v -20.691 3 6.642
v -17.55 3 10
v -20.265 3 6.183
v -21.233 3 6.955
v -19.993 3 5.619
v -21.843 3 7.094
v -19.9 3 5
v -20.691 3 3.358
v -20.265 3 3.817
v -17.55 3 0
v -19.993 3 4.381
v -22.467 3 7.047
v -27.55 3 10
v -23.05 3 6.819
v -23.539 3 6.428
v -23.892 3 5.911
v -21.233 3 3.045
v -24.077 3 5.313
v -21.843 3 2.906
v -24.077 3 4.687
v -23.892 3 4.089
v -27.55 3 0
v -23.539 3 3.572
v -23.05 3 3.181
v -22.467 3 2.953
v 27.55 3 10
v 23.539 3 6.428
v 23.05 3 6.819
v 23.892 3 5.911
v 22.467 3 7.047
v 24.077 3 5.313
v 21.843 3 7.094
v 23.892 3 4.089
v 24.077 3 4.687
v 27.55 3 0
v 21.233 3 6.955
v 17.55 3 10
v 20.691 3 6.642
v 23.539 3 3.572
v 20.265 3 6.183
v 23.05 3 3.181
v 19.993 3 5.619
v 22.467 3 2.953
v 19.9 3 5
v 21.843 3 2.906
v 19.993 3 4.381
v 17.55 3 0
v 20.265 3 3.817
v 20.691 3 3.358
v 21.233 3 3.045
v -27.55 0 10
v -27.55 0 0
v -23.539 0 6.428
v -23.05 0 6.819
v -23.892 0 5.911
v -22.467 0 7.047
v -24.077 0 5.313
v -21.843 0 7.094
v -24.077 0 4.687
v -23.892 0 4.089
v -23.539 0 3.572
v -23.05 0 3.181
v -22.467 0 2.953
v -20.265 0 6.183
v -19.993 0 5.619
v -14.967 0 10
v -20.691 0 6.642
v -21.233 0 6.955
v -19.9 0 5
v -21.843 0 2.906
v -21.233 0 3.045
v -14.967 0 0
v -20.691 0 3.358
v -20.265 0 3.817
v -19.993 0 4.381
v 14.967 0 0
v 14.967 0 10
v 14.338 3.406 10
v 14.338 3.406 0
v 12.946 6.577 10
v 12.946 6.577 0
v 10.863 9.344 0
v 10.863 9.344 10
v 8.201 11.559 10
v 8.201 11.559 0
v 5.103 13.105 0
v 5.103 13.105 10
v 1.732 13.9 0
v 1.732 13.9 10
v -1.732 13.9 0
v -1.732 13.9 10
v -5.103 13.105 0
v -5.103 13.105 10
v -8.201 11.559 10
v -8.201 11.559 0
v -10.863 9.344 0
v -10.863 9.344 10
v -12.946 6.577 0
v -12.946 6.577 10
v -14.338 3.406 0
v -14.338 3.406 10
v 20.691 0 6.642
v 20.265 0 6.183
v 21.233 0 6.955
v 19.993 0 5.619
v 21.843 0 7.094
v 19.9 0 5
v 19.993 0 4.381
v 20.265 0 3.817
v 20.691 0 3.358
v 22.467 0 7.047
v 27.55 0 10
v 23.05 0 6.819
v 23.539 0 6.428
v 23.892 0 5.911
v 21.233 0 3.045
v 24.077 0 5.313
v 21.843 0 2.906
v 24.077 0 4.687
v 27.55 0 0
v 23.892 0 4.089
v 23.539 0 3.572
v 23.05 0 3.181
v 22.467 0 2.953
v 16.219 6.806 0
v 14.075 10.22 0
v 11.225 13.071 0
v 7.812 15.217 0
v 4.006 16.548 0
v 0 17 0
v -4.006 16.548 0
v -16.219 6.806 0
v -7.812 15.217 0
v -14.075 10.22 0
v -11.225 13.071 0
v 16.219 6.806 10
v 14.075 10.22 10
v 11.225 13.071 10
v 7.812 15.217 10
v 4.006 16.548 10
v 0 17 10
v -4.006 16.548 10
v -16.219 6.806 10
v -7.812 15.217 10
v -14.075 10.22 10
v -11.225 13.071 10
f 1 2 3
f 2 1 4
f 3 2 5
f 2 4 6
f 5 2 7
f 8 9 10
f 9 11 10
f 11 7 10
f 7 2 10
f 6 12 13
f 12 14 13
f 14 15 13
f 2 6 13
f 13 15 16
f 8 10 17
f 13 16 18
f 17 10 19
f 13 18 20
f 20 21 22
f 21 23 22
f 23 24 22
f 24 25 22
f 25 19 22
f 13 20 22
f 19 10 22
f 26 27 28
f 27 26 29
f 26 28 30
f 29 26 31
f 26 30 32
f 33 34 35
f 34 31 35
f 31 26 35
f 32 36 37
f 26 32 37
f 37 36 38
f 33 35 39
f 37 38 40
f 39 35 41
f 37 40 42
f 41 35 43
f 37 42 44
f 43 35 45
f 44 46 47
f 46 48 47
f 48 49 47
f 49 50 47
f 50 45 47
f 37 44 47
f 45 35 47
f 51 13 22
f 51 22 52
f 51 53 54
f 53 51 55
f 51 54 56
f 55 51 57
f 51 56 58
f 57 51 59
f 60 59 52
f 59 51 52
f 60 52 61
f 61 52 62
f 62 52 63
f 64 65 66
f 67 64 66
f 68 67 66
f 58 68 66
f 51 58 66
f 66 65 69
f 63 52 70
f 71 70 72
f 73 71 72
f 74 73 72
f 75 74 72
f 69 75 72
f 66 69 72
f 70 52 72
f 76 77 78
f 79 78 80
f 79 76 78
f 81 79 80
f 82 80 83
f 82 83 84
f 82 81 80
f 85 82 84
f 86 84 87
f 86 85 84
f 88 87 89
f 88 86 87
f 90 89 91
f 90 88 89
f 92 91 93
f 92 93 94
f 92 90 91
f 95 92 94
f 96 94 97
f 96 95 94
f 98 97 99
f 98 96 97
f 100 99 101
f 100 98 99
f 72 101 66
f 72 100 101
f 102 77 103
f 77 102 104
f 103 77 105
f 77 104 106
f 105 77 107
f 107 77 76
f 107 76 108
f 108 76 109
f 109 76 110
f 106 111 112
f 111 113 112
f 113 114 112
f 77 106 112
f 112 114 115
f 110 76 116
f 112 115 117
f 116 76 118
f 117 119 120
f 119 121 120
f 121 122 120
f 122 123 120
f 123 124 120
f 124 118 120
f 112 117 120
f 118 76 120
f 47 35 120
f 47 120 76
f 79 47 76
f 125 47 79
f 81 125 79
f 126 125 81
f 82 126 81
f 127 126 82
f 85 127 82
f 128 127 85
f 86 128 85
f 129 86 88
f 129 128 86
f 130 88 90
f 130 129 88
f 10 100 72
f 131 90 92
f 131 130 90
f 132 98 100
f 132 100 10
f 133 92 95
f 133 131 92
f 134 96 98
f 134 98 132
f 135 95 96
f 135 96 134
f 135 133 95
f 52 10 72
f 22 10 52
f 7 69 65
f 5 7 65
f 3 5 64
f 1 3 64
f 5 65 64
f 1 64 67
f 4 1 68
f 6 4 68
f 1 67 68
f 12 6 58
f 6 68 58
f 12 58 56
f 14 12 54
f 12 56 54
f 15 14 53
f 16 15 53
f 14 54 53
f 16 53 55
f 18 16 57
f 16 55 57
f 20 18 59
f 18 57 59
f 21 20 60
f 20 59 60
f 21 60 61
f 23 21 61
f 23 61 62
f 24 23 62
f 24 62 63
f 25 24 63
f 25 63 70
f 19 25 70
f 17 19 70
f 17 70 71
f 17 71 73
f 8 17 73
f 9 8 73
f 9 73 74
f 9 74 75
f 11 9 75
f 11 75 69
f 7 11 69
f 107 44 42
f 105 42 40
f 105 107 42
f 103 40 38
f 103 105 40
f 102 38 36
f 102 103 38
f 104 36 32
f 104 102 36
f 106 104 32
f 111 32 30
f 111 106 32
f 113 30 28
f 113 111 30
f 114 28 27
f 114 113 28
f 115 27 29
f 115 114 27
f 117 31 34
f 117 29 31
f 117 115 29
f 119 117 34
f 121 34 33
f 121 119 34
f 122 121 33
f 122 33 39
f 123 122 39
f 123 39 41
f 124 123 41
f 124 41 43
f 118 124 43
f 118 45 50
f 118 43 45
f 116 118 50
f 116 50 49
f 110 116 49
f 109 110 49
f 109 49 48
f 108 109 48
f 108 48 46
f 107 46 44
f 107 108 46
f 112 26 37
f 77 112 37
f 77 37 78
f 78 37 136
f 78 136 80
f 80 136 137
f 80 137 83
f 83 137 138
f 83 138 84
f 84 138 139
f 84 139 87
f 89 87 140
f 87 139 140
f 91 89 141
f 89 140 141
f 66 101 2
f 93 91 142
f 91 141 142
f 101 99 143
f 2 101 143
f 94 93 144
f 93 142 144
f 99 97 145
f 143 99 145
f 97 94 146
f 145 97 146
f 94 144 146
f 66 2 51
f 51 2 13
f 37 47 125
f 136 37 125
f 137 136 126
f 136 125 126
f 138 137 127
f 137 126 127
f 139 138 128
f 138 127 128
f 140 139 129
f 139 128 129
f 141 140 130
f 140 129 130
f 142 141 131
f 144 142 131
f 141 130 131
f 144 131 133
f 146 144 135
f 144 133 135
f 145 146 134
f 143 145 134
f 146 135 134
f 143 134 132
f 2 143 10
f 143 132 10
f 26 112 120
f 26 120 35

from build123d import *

# Parameters (mm, degrees)
PAD_DEPTH    = 10
SKETCH001_R  = 2.1
POCKET_DEPTH = 134.047902


with BuildPart() as part:
    # Sketch → Pad (new body)
    with BuildSketch(Plane.XY):
        with BuildLine():
            ThreePointArc((14.96663, 0), (0, 14), (-14.96663, 0))
            Line((-27.549929, 0), (-14.96663, 0))
            Line((-27.549929, 3), (-27.549929, 0))
            Line((-17.549929, 3), (-27.549929, 3))
            ThreePointArc((17.549929, 3), (0, 17), (-17.549929, 3))
            Line((27.549929, 3), (17.549929, 3))
            Line((27.549929, 0), (27.549929, 3))
            Line((14.96663, 0), (27.549929, 0))
        make_face()
    extrude(amount=PAD_DEPTH)

    # Sketch001 → Pocket (cut, through all)
    with BuildSketch(Plane.XZ):
        with Locations((-22, 5)):
            Circle(SKETCH001_R)
    pocket = extrude(amount=-POCKET_DEPTH, mode=Mode.SUBTRACT)

    # Mirrored: Pocket across Sketch001 V_Axis
    add(pocket.mirror(Plane(origin=(0, 0, 0), x_dir=(0, -1, 0), z_dir=(1, 0, 0))), mode=Mode.SUBTRACT)


solid = part.part
